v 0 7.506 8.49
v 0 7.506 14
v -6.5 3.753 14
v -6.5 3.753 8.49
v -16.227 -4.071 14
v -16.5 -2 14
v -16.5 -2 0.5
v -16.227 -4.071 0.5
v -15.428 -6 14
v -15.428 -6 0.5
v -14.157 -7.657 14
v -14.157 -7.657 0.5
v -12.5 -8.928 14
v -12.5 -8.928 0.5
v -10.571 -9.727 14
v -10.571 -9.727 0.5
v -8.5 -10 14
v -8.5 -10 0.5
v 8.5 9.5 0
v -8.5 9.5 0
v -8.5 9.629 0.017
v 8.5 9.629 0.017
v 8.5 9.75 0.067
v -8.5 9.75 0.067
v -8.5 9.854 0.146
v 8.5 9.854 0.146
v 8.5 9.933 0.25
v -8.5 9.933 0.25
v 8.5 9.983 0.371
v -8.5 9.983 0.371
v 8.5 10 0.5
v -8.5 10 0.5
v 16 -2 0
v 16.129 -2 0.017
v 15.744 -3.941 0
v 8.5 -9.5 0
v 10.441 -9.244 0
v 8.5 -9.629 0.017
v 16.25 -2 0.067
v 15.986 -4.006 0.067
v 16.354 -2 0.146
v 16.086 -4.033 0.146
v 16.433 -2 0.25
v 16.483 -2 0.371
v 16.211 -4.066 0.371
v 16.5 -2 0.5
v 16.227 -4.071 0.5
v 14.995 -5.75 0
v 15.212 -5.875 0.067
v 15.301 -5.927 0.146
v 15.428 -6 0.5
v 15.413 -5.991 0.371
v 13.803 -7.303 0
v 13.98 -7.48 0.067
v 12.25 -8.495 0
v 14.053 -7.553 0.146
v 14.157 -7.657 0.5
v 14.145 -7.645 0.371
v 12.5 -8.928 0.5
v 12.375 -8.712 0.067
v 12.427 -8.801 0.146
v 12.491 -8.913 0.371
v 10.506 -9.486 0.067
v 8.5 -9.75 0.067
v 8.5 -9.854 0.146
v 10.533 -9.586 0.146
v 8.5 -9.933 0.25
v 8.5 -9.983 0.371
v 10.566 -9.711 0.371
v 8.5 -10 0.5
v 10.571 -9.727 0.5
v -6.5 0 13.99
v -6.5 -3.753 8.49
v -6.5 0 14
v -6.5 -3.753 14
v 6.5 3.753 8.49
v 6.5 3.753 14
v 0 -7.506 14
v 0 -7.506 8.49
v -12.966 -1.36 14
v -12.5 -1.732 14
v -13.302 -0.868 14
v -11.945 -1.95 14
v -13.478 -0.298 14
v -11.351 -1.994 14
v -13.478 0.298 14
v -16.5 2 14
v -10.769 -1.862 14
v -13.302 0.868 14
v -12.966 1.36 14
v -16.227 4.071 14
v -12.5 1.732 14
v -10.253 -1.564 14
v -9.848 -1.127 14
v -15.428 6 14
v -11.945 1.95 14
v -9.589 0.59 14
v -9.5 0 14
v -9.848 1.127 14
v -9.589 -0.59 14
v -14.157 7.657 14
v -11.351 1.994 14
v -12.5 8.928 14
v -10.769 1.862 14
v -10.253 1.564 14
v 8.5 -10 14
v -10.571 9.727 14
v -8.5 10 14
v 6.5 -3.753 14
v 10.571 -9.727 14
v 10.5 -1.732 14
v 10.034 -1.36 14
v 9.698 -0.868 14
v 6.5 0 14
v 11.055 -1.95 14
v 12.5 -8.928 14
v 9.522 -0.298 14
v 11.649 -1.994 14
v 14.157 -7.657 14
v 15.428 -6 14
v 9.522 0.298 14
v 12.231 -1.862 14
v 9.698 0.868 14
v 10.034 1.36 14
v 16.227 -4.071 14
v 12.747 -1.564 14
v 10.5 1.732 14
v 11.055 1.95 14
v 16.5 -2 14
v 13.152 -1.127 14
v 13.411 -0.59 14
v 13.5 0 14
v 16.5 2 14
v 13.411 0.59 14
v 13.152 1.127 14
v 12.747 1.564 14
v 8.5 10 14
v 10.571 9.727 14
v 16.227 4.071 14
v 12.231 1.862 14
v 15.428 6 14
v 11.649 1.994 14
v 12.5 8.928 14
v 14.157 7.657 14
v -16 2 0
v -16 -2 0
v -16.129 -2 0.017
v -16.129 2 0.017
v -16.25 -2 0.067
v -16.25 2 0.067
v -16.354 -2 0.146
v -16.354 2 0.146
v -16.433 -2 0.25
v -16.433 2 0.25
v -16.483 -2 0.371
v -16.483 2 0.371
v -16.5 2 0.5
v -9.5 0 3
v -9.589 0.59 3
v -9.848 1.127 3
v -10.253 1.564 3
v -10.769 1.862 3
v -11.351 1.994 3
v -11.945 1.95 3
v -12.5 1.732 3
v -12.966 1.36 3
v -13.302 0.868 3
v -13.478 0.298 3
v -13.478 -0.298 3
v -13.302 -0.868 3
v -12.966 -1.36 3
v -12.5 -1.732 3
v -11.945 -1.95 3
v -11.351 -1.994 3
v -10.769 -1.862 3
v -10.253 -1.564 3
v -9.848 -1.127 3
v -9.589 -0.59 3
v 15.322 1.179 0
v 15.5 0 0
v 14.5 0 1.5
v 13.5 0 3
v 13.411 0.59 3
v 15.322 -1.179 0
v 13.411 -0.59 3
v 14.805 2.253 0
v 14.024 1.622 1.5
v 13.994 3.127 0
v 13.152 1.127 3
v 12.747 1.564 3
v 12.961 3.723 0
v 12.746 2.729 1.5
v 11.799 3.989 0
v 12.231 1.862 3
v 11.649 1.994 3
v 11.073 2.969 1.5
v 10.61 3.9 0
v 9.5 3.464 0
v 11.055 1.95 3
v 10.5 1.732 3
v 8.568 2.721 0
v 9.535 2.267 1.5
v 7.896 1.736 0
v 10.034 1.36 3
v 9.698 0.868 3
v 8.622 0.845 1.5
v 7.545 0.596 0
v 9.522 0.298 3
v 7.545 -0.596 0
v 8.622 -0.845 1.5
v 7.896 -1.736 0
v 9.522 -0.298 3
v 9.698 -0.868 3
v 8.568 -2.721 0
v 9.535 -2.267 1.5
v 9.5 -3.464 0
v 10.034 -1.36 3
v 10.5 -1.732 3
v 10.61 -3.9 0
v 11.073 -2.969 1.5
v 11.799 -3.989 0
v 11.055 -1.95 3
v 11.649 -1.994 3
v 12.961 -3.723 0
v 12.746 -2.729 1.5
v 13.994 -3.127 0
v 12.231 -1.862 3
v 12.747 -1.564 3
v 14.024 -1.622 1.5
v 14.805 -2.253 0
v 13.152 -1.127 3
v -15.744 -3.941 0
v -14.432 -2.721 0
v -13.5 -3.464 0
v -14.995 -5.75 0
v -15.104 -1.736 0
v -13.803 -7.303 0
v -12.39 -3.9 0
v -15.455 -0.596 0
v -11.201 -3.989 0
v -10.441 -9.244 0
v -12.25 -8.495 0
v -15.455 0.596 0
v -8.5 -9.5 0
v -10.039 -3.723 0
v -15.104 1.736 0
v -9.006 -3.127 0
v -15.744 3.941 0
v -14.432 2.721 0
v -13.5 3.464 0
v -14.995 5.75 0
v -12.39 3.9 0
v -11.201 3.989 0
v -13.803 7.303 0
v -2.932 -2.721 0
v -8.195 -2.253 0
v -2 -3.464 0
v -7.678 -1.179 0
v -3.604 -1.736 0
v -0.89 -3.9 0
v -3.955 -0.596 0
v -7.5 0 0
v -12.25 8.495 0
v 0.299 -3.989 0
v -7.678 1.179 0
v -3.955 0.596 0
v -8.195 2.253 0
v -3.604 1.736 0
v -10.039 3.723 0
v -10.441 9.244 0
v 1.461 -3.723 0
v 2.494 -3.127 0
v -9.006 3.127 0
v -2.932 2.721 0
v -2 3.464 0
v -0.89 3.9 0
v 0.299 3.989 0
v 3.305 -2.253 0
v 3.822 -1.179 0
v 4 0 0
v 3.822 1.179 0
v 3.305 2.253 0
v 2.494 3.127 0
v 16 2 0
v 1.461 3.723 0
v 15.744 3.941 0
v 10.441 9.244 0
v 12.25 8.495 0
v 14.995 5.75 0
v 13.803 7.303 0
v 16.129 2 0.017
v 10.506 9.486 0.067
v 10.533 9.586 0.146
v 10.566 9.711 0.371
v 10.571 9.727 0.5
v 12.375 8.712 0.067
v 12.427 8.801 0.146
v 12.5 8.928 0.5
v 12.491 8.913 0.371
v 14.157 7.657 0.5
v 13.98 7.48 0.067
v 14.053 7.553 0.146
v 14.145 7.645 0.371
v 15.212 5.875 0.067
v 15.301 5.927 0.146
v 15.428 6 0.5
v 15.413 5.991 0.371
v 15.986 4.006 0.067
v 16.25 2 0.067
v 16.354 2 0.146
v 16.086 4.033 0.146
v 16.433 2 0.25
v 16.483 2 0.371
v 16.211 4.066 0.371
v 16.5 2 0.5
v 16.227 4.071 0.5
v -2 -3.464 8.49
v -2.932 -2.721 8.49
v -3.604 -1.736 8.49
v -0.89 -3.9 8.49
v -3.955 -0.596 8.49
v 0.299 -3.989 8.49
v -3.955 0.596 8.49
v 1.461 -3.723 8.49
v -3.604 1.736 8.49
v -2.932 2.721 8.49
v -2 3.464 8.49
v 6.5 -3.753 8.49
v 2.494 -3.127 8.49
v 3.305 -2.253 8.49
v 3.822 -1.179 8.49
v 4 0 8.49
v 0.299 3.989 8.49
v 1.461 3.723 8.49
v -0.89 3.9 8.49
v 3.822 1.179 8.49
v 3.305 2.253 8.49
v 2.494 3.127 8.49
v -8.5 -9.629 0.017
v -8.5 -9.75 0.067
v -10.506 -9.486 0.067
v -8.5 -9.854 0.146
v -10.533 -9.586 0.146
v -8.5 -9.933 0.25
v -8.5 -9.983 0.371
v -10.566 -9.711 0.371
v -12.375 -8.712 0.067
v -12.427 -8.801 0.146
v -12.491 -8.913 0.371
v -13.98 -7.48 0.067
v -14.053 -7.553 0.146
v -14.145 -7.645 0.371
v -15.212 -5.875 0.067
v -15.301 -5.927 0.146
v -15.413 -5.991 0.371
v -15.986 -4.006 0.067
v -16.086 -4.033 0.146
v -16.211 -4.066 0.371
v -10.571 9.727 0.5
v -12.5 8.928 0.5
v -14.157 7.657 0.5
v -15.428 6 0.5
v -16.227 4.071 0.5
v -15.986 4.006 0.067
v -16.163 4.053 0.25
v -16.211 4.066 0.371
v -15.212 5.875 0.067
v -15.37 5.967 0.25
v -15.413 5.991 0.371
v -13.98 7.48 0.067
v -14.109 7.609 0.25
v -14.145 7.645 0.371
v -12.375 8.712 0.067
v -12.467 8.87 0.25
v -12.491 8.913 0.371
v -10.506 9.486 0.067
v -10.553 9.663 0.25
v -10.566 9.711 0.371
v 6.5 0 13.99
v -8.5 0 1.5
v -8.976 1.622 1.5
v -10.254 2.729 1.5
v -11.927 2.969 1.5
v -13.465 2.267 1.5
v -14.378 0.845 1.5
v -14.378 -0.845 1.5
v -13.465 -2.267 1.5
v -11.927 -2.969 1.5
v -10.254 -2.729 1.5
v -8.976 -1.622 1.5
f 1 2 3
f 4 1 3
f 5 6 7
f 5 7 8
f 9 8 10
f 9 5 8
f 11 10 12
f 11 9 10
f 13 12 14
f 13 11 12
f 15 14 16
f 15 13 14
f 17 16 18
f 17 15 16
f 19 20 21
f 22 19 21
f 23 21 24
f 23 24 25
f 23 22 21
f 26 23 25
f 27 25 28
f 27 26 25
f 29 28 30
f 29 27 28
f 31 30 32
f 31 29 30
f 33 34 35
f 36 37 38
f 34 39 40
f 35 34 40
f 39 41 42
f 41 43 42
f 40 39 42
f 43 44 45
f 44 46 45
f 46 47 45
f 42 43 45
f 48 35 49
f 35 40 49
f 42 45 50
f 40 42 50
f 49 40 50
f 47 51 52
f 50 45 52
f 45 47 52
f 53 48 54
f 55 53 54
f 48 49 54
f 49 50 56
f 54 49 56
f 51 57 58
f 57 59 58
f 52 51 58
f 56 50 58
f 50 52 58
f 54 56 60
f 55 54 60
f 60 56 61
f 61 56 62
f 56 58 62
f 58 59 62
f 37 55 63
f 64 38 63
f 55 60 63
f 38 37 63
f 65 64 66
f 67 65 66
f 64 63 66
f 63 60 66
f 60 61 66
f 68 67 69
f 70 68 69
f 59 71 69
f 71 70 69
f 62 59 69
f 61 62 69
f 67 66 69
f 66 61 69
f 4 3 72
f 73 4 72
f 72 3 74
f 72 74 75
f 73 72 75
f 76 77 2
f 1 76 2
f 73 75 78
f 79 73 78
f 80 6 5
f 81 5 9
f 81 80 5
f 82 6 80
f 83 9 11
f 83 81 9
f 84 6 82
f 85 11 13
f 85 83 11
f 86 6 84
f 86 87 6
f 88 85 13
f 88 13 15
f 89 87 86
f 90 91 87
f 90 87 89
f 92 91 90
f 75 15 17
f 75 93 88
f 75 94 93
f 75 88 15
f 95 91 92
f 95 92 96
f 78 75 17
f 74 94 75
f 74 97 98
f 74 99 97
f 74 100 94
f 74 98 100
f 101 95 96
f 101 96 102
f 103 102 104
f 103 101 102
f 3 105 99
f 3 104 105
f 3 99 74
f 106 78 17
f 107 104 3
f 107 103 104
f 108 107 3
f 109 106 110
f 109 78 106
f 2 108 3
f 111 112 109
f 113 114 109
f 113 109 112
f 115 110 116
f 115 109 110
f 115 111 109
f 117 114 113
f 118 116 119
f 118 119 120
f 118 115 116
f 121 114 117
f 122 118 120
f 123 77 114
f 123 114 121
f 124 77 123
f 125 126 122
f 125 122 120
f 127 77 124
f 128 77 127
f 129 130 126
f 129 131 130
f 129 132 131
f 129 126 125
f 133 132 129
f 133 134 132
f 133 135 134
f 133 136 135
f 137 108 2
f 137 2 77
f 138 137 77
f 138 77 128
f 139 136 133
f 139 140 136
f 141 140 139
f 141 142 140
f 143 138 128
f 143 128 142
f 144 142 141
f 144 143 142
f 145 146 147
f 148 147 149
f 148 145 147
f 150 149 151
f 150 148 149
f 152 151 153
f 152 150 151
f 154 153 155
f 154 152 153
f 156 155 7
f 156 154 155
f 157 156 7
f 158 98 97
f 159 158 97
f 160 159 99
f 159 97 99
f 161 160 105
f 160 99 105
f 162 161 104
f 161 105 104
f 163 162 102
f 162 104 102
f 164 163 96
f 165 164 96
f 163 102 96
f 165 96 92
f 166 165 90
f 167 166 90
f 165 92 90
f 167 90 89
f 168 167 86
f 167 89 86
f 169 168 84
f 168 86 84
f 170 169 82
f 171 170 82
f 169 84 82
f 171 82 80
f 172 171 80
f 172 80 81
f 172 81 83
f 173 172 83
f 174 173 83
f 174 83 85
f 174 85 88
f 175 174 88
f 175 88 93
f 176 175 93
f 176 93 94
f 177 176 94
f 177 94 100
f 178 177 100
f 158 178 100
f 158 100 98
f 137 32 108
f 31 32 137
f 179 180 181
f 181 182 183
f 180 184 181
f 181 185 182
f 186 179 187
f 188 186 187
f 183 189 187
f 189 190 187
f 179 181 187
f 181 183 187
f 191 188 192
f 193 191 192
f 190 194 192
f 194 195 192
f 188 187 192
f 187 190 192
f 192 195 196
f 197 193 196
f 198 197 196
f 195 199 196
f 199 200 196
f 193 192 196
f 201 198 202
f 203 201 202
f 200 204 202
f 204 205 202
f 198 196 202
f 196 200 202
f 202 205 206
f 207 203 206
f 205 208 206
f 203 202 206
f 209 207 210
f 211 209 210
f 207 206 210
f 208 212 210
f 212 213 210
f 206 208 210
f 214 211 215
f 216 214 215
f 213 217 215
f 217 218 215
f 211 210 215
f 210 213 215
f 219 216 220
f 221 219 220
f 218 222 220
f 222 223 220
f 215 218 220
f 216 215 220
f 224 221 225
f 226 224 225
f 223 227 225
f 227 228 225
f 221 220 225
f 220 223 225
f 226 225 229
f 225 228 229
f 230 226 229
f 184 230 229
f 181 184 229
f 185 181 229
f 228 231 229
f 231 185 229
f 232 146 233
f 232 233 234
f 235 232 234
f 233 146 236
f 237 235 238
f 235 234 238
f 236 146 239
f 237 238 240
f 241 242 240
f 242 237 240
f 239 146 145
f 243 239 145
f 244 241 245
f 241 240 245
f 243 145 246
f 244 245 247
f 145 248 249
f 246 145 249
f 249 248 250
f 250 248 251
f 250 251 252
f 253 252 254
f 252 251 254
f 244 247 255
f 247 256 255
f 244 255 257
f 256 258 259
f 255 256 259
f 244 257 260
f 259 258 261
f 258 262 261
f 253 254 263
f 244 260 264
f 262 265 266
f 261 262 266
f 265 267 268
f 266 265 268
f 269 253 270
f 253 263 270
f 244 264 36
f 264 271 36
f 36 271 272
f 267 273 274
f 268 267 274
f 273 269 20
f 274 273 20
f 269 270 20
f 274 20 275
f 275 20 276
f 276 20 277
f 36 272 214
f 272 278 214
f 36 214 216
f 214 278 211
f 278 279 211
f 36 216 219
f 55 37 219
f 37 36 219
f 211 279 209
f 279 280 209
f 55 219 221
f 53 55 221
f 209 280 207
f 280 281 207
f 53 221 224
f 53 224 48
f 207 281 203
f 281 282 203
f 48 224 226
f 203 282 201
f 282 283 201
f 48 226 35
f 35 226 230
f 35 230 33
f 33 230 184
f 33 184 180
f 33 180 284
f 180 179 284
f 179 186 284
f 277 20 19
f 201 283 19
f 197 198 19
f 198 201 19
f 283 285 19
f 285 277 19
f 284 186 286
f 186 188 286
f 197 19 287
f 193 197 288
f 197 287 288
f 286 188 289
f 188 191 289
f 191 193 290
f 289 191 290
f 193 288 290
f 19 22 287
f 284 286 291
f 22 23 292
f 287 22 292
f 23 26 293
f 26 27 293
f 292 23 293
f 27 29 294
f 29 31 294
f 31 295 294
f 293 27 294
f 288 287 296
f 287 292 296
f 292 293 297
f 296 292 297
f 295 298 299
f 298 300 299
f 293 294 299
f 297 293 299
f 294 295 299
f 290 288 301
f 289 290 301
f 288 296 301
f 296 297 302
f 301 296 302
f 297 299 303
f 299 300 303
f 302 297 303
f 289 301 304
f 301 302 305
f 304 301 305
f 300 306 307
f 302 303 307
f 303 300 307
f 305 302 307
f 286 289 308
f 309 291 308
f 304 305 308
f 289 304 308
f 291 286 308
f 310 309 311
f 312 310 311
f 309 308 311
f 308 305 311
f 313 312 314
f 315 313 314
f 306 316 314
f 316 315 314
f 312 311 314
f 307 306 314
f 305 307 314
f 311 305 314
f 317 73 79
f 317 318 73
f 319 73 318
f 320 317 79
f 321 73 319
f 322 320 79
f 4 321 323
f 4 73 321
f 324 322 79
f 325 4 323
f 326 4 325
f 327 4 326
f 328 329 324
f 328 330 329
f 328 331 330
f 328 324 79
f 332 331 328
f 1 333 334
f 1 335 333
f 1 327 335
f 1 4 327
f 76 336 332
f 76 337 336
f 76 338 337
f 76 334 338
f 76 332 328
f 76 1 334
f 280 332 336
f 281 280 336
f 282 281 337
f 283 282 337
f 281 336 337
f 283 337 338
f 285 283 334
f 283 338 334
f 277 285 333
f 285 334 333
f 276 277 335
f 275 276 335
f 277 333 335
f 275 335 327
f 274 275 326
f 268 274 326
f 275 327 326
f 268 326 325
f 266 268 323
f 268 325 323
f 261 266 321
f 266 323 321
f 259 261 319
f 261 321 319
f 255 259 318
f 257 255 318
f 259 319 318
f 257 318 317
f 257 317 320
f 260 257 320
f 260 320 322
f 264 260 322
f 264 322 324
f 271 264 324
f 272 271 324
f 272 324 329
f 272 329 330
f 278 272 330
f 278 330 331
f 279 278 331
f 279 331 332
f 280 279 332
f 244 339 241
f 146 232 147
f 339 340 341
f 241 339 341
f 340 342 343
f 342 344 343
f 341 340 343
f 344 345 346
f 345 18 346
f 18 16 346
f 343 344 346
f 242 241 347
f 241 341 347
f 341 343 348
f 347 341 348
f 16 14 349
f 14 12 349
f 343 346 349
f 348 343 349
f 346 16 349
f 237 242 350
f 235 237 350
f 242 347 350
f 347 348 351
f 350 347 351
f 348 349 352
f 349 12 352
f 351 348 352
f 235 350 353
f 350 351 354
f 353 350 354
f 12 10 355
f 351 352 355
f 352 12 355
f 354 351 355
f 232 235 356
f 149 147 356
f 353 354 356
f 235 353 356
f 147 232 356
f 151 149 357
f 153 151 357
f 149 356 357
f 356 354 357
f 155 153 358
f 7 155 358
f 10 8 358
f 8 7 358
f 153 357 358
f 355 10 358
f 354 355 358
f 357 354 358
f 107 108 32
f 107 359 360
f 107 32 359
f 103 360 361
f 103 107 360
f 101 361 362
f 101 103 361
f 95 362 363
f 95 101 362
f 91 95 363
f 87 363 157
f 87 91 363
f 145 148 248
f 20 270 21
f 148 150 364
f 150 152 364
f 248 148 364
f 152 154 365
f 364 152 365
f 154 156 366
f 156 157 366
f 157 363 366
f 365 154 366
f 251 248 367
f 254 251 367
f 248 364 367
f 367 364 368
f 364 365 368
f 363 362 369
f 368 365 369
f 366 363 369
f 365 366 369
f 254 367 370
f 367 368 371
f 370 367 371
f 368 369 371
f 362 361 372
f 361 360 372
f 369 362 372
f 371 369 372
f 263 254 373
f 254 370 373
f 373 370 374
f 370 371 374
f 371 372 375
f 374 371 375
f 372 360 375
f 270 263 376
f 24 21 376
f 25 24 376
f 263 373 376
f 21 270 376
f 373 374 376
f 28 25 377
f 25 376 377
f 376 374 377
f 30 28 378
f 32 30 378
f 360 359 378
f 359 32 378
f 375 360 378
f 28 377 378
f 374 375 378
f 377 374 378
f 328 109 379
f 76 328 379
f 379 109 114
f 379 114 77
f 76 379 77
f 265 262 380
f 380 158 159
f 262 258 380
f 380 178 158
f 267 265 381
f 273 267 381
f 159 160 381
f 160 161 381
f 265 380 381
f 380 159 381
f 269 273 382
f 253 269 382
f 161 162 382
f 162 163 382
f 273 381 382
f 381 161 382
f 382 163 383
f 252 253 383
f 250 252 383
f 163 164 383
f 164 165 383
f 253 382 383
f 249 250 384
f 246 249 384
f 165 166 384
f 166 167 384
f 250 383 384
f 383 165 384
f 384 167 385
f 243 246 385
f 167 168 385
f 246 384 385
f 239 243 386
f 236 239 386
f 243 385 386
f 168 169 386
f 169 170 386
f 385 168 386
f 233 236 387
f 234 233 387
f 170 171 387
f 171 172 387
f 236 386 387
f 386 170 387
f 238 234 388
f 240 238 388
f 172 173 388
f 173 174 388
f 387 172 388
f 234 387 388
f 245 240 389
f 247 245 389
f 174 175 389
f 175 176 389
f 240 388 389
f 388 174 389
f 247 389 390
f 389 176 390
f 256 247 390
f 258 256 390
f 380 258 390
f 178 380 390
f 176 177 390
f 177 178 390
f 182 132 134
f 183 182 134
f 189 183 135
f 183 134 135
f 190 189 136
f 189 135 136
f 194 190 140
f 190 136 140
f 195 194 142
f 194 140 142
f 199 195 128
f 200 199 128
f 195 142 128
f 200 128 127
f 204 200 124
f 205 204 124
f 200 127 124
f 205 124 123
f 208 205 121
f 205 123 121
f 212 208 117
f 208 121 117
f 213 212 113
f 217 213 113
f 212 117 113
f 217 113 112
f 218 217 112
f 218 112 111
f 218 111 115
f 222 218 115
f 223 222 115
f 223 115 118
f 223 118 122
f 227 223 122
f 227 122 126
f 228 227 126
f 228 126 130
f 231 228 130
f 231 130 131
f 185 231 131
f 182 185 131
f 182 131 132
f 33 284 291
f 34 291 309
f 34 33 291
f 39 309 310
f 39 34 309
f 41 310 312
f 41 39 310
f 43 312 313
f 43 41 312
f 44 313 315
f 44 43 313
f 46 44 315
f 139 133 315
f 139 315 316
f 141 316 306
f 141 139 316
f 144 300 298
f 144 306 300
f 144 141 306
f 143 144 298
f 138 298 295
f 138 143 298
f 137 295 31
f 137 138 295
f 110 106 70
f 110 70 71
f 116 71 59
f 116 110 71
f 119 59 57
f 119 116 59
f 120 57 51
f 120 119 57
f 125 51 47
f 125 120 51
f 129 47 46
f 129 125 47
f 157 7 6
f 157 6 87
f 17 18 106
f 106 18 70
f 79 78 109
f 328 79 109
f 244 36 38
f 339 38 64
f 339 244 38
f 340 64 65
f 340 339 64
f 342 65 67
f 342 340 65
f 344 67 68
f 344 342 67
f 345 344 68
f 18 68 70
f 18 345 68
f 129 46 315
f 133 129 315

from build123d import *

# Parameters (mm, degrees)
SKETCH_W         = 33
SKETCH_H         = 20
PAD_DEPTH        = 14
FILLET_R         = 8
FILLET001_R      = 8
FILLET002_R      = 8
FILLET003_R      = 8
POCKET_DEPTH     = 5.51
SKETCH002_R      = 4
POCKET001_DEPTH  = 8.491
SKETCH003_R      = 2
POCKET002_DEPTH  = 14.001
CHAMFER_SIZE2    = 3
CHAMFER_SIZE     = 2
CHAMFER001_SIZE2 = 3
CHAMFER001_SIZE  = 2
FILLET004_R      = 0.5
SKETCH004_R      = 6.5
POCKET003_DEPTH  = 0.01


with BuildPart() as part:
    # Sketch → Pad (new body)
    with BuildSketch(Plane.XY):
        Rectangle(SKETCH_W, SKETCH_H)
    extrude(amount=PAD_DEPTH)

    # Fillet
    fillet_edges = [part.edges().sort_by_distance(p)[0] for p in [
        (-16.5, -10, 7),
    ]]
    fillet(fillet_edges, radius=FILLET_R)

    # Fillet001
    fillet001_edges = [part.edges().sort_by_distance(p)[0] for p in [
        (16.5, -10, 7),
    ]]
    fillet(fillet001_edges, radius=FILLET001_R)

    # Fillet002
    fillet002_edges = [part.edges().sort_by_distance(p)[0] for p in [
        (16.5, 10, 7),
    ]]
    fillet(fillet002_edges, radius=FILLET002_R)

    # Fillet003
    fillet003_edges = [part.edges().sort_by_distance(p)[0] for p in [
        (-16.5, 10, 7),
    ]]
    fillet(fillet003_edges, radius=FILLET003_R)

    # Sketch001 (on Face10 of Fillet003) → Pocket (cut)
    with BuildSketch(Plane.XY.offset(14)):
        Polygon((-6.5, 3.752777), (-6.5, -3.752777), (0, -7.505553), (6.5, -3.752777), (6.5, 3.752777), (0, 7.505553), align=None)
    extrude(amount=-POCKET_DEPTH, mode=Mode.SUBTRACT)

    # Sketch002 (on Face17 of Pocket) → Pocket001 (cut, through all)
    with BuildSketch(Plane.XY.offset(8.49)):
        Circle(SKETCH002_R)
    extrude(amount=-POCKET001_DEPTH, mode=Mode.SUBTRACT)

    # Sketch003 (on Face11 of Pocket001) → Pocket002 (cut, through all)
    with BuildSketch(Plane.XY.offset(14)):
        with Locations((-11.5, 0)):
            Circle(SKETCH003_R)
        with Locations((11.5, 0)):
            Circle(SKETCH003_R)
    extrude(amount=-POCKET002_DEPTH, mode=Mode.SUBTRACT)

    # Chamfer
    chamfer_edges = [part.edges().sort_by_distance(p)[0] for p in [
        (9.5, 0, 0),
    ]]
    chamfer_side = part.faces().sort_by_distance((0, 9.614124, 0))[0]
    chamfer(chamfer_edges, length=CHAMFER_SIZE, length2=CHAMFER_SIZE2, reference=chamfer_side)

    # Chamfer001
    chamfer001_edges = [part.edges().sort_by_distance(p)[0] for p in [
        (-13.5, 0, 0),
    ]]
    chamfer001_side = part.faces().sort_by_distance((7.114124, 0, 0))[0]
    chamfer(chamfer001_edges, length=CHAMFER001_SIZE, length2=CHAMFER001_SIZE2, reference=chamfer001_side)

    # Fillet004
    fillet004_edges = [part.edges().sort_by_distance(p)[0] for p in [
        (0, 10, 0),
        (-16.5, 0, 0),
        (0, -10, 0),
        (16.5, 0, 0),
    ]]
    fillet(fillet004_edges, radius=FILLET004_R)

    # Sketch004 (on Face24 of Fillet004) → Pocket003 (cut)
    with BuildSketch(Plane.XY.offset(14)):
        Circle(SKETCH004_R)
    extrude(amount=-POCKET003_DEPTH, mode=Mode.SUBTRACT)


solid = part.part
